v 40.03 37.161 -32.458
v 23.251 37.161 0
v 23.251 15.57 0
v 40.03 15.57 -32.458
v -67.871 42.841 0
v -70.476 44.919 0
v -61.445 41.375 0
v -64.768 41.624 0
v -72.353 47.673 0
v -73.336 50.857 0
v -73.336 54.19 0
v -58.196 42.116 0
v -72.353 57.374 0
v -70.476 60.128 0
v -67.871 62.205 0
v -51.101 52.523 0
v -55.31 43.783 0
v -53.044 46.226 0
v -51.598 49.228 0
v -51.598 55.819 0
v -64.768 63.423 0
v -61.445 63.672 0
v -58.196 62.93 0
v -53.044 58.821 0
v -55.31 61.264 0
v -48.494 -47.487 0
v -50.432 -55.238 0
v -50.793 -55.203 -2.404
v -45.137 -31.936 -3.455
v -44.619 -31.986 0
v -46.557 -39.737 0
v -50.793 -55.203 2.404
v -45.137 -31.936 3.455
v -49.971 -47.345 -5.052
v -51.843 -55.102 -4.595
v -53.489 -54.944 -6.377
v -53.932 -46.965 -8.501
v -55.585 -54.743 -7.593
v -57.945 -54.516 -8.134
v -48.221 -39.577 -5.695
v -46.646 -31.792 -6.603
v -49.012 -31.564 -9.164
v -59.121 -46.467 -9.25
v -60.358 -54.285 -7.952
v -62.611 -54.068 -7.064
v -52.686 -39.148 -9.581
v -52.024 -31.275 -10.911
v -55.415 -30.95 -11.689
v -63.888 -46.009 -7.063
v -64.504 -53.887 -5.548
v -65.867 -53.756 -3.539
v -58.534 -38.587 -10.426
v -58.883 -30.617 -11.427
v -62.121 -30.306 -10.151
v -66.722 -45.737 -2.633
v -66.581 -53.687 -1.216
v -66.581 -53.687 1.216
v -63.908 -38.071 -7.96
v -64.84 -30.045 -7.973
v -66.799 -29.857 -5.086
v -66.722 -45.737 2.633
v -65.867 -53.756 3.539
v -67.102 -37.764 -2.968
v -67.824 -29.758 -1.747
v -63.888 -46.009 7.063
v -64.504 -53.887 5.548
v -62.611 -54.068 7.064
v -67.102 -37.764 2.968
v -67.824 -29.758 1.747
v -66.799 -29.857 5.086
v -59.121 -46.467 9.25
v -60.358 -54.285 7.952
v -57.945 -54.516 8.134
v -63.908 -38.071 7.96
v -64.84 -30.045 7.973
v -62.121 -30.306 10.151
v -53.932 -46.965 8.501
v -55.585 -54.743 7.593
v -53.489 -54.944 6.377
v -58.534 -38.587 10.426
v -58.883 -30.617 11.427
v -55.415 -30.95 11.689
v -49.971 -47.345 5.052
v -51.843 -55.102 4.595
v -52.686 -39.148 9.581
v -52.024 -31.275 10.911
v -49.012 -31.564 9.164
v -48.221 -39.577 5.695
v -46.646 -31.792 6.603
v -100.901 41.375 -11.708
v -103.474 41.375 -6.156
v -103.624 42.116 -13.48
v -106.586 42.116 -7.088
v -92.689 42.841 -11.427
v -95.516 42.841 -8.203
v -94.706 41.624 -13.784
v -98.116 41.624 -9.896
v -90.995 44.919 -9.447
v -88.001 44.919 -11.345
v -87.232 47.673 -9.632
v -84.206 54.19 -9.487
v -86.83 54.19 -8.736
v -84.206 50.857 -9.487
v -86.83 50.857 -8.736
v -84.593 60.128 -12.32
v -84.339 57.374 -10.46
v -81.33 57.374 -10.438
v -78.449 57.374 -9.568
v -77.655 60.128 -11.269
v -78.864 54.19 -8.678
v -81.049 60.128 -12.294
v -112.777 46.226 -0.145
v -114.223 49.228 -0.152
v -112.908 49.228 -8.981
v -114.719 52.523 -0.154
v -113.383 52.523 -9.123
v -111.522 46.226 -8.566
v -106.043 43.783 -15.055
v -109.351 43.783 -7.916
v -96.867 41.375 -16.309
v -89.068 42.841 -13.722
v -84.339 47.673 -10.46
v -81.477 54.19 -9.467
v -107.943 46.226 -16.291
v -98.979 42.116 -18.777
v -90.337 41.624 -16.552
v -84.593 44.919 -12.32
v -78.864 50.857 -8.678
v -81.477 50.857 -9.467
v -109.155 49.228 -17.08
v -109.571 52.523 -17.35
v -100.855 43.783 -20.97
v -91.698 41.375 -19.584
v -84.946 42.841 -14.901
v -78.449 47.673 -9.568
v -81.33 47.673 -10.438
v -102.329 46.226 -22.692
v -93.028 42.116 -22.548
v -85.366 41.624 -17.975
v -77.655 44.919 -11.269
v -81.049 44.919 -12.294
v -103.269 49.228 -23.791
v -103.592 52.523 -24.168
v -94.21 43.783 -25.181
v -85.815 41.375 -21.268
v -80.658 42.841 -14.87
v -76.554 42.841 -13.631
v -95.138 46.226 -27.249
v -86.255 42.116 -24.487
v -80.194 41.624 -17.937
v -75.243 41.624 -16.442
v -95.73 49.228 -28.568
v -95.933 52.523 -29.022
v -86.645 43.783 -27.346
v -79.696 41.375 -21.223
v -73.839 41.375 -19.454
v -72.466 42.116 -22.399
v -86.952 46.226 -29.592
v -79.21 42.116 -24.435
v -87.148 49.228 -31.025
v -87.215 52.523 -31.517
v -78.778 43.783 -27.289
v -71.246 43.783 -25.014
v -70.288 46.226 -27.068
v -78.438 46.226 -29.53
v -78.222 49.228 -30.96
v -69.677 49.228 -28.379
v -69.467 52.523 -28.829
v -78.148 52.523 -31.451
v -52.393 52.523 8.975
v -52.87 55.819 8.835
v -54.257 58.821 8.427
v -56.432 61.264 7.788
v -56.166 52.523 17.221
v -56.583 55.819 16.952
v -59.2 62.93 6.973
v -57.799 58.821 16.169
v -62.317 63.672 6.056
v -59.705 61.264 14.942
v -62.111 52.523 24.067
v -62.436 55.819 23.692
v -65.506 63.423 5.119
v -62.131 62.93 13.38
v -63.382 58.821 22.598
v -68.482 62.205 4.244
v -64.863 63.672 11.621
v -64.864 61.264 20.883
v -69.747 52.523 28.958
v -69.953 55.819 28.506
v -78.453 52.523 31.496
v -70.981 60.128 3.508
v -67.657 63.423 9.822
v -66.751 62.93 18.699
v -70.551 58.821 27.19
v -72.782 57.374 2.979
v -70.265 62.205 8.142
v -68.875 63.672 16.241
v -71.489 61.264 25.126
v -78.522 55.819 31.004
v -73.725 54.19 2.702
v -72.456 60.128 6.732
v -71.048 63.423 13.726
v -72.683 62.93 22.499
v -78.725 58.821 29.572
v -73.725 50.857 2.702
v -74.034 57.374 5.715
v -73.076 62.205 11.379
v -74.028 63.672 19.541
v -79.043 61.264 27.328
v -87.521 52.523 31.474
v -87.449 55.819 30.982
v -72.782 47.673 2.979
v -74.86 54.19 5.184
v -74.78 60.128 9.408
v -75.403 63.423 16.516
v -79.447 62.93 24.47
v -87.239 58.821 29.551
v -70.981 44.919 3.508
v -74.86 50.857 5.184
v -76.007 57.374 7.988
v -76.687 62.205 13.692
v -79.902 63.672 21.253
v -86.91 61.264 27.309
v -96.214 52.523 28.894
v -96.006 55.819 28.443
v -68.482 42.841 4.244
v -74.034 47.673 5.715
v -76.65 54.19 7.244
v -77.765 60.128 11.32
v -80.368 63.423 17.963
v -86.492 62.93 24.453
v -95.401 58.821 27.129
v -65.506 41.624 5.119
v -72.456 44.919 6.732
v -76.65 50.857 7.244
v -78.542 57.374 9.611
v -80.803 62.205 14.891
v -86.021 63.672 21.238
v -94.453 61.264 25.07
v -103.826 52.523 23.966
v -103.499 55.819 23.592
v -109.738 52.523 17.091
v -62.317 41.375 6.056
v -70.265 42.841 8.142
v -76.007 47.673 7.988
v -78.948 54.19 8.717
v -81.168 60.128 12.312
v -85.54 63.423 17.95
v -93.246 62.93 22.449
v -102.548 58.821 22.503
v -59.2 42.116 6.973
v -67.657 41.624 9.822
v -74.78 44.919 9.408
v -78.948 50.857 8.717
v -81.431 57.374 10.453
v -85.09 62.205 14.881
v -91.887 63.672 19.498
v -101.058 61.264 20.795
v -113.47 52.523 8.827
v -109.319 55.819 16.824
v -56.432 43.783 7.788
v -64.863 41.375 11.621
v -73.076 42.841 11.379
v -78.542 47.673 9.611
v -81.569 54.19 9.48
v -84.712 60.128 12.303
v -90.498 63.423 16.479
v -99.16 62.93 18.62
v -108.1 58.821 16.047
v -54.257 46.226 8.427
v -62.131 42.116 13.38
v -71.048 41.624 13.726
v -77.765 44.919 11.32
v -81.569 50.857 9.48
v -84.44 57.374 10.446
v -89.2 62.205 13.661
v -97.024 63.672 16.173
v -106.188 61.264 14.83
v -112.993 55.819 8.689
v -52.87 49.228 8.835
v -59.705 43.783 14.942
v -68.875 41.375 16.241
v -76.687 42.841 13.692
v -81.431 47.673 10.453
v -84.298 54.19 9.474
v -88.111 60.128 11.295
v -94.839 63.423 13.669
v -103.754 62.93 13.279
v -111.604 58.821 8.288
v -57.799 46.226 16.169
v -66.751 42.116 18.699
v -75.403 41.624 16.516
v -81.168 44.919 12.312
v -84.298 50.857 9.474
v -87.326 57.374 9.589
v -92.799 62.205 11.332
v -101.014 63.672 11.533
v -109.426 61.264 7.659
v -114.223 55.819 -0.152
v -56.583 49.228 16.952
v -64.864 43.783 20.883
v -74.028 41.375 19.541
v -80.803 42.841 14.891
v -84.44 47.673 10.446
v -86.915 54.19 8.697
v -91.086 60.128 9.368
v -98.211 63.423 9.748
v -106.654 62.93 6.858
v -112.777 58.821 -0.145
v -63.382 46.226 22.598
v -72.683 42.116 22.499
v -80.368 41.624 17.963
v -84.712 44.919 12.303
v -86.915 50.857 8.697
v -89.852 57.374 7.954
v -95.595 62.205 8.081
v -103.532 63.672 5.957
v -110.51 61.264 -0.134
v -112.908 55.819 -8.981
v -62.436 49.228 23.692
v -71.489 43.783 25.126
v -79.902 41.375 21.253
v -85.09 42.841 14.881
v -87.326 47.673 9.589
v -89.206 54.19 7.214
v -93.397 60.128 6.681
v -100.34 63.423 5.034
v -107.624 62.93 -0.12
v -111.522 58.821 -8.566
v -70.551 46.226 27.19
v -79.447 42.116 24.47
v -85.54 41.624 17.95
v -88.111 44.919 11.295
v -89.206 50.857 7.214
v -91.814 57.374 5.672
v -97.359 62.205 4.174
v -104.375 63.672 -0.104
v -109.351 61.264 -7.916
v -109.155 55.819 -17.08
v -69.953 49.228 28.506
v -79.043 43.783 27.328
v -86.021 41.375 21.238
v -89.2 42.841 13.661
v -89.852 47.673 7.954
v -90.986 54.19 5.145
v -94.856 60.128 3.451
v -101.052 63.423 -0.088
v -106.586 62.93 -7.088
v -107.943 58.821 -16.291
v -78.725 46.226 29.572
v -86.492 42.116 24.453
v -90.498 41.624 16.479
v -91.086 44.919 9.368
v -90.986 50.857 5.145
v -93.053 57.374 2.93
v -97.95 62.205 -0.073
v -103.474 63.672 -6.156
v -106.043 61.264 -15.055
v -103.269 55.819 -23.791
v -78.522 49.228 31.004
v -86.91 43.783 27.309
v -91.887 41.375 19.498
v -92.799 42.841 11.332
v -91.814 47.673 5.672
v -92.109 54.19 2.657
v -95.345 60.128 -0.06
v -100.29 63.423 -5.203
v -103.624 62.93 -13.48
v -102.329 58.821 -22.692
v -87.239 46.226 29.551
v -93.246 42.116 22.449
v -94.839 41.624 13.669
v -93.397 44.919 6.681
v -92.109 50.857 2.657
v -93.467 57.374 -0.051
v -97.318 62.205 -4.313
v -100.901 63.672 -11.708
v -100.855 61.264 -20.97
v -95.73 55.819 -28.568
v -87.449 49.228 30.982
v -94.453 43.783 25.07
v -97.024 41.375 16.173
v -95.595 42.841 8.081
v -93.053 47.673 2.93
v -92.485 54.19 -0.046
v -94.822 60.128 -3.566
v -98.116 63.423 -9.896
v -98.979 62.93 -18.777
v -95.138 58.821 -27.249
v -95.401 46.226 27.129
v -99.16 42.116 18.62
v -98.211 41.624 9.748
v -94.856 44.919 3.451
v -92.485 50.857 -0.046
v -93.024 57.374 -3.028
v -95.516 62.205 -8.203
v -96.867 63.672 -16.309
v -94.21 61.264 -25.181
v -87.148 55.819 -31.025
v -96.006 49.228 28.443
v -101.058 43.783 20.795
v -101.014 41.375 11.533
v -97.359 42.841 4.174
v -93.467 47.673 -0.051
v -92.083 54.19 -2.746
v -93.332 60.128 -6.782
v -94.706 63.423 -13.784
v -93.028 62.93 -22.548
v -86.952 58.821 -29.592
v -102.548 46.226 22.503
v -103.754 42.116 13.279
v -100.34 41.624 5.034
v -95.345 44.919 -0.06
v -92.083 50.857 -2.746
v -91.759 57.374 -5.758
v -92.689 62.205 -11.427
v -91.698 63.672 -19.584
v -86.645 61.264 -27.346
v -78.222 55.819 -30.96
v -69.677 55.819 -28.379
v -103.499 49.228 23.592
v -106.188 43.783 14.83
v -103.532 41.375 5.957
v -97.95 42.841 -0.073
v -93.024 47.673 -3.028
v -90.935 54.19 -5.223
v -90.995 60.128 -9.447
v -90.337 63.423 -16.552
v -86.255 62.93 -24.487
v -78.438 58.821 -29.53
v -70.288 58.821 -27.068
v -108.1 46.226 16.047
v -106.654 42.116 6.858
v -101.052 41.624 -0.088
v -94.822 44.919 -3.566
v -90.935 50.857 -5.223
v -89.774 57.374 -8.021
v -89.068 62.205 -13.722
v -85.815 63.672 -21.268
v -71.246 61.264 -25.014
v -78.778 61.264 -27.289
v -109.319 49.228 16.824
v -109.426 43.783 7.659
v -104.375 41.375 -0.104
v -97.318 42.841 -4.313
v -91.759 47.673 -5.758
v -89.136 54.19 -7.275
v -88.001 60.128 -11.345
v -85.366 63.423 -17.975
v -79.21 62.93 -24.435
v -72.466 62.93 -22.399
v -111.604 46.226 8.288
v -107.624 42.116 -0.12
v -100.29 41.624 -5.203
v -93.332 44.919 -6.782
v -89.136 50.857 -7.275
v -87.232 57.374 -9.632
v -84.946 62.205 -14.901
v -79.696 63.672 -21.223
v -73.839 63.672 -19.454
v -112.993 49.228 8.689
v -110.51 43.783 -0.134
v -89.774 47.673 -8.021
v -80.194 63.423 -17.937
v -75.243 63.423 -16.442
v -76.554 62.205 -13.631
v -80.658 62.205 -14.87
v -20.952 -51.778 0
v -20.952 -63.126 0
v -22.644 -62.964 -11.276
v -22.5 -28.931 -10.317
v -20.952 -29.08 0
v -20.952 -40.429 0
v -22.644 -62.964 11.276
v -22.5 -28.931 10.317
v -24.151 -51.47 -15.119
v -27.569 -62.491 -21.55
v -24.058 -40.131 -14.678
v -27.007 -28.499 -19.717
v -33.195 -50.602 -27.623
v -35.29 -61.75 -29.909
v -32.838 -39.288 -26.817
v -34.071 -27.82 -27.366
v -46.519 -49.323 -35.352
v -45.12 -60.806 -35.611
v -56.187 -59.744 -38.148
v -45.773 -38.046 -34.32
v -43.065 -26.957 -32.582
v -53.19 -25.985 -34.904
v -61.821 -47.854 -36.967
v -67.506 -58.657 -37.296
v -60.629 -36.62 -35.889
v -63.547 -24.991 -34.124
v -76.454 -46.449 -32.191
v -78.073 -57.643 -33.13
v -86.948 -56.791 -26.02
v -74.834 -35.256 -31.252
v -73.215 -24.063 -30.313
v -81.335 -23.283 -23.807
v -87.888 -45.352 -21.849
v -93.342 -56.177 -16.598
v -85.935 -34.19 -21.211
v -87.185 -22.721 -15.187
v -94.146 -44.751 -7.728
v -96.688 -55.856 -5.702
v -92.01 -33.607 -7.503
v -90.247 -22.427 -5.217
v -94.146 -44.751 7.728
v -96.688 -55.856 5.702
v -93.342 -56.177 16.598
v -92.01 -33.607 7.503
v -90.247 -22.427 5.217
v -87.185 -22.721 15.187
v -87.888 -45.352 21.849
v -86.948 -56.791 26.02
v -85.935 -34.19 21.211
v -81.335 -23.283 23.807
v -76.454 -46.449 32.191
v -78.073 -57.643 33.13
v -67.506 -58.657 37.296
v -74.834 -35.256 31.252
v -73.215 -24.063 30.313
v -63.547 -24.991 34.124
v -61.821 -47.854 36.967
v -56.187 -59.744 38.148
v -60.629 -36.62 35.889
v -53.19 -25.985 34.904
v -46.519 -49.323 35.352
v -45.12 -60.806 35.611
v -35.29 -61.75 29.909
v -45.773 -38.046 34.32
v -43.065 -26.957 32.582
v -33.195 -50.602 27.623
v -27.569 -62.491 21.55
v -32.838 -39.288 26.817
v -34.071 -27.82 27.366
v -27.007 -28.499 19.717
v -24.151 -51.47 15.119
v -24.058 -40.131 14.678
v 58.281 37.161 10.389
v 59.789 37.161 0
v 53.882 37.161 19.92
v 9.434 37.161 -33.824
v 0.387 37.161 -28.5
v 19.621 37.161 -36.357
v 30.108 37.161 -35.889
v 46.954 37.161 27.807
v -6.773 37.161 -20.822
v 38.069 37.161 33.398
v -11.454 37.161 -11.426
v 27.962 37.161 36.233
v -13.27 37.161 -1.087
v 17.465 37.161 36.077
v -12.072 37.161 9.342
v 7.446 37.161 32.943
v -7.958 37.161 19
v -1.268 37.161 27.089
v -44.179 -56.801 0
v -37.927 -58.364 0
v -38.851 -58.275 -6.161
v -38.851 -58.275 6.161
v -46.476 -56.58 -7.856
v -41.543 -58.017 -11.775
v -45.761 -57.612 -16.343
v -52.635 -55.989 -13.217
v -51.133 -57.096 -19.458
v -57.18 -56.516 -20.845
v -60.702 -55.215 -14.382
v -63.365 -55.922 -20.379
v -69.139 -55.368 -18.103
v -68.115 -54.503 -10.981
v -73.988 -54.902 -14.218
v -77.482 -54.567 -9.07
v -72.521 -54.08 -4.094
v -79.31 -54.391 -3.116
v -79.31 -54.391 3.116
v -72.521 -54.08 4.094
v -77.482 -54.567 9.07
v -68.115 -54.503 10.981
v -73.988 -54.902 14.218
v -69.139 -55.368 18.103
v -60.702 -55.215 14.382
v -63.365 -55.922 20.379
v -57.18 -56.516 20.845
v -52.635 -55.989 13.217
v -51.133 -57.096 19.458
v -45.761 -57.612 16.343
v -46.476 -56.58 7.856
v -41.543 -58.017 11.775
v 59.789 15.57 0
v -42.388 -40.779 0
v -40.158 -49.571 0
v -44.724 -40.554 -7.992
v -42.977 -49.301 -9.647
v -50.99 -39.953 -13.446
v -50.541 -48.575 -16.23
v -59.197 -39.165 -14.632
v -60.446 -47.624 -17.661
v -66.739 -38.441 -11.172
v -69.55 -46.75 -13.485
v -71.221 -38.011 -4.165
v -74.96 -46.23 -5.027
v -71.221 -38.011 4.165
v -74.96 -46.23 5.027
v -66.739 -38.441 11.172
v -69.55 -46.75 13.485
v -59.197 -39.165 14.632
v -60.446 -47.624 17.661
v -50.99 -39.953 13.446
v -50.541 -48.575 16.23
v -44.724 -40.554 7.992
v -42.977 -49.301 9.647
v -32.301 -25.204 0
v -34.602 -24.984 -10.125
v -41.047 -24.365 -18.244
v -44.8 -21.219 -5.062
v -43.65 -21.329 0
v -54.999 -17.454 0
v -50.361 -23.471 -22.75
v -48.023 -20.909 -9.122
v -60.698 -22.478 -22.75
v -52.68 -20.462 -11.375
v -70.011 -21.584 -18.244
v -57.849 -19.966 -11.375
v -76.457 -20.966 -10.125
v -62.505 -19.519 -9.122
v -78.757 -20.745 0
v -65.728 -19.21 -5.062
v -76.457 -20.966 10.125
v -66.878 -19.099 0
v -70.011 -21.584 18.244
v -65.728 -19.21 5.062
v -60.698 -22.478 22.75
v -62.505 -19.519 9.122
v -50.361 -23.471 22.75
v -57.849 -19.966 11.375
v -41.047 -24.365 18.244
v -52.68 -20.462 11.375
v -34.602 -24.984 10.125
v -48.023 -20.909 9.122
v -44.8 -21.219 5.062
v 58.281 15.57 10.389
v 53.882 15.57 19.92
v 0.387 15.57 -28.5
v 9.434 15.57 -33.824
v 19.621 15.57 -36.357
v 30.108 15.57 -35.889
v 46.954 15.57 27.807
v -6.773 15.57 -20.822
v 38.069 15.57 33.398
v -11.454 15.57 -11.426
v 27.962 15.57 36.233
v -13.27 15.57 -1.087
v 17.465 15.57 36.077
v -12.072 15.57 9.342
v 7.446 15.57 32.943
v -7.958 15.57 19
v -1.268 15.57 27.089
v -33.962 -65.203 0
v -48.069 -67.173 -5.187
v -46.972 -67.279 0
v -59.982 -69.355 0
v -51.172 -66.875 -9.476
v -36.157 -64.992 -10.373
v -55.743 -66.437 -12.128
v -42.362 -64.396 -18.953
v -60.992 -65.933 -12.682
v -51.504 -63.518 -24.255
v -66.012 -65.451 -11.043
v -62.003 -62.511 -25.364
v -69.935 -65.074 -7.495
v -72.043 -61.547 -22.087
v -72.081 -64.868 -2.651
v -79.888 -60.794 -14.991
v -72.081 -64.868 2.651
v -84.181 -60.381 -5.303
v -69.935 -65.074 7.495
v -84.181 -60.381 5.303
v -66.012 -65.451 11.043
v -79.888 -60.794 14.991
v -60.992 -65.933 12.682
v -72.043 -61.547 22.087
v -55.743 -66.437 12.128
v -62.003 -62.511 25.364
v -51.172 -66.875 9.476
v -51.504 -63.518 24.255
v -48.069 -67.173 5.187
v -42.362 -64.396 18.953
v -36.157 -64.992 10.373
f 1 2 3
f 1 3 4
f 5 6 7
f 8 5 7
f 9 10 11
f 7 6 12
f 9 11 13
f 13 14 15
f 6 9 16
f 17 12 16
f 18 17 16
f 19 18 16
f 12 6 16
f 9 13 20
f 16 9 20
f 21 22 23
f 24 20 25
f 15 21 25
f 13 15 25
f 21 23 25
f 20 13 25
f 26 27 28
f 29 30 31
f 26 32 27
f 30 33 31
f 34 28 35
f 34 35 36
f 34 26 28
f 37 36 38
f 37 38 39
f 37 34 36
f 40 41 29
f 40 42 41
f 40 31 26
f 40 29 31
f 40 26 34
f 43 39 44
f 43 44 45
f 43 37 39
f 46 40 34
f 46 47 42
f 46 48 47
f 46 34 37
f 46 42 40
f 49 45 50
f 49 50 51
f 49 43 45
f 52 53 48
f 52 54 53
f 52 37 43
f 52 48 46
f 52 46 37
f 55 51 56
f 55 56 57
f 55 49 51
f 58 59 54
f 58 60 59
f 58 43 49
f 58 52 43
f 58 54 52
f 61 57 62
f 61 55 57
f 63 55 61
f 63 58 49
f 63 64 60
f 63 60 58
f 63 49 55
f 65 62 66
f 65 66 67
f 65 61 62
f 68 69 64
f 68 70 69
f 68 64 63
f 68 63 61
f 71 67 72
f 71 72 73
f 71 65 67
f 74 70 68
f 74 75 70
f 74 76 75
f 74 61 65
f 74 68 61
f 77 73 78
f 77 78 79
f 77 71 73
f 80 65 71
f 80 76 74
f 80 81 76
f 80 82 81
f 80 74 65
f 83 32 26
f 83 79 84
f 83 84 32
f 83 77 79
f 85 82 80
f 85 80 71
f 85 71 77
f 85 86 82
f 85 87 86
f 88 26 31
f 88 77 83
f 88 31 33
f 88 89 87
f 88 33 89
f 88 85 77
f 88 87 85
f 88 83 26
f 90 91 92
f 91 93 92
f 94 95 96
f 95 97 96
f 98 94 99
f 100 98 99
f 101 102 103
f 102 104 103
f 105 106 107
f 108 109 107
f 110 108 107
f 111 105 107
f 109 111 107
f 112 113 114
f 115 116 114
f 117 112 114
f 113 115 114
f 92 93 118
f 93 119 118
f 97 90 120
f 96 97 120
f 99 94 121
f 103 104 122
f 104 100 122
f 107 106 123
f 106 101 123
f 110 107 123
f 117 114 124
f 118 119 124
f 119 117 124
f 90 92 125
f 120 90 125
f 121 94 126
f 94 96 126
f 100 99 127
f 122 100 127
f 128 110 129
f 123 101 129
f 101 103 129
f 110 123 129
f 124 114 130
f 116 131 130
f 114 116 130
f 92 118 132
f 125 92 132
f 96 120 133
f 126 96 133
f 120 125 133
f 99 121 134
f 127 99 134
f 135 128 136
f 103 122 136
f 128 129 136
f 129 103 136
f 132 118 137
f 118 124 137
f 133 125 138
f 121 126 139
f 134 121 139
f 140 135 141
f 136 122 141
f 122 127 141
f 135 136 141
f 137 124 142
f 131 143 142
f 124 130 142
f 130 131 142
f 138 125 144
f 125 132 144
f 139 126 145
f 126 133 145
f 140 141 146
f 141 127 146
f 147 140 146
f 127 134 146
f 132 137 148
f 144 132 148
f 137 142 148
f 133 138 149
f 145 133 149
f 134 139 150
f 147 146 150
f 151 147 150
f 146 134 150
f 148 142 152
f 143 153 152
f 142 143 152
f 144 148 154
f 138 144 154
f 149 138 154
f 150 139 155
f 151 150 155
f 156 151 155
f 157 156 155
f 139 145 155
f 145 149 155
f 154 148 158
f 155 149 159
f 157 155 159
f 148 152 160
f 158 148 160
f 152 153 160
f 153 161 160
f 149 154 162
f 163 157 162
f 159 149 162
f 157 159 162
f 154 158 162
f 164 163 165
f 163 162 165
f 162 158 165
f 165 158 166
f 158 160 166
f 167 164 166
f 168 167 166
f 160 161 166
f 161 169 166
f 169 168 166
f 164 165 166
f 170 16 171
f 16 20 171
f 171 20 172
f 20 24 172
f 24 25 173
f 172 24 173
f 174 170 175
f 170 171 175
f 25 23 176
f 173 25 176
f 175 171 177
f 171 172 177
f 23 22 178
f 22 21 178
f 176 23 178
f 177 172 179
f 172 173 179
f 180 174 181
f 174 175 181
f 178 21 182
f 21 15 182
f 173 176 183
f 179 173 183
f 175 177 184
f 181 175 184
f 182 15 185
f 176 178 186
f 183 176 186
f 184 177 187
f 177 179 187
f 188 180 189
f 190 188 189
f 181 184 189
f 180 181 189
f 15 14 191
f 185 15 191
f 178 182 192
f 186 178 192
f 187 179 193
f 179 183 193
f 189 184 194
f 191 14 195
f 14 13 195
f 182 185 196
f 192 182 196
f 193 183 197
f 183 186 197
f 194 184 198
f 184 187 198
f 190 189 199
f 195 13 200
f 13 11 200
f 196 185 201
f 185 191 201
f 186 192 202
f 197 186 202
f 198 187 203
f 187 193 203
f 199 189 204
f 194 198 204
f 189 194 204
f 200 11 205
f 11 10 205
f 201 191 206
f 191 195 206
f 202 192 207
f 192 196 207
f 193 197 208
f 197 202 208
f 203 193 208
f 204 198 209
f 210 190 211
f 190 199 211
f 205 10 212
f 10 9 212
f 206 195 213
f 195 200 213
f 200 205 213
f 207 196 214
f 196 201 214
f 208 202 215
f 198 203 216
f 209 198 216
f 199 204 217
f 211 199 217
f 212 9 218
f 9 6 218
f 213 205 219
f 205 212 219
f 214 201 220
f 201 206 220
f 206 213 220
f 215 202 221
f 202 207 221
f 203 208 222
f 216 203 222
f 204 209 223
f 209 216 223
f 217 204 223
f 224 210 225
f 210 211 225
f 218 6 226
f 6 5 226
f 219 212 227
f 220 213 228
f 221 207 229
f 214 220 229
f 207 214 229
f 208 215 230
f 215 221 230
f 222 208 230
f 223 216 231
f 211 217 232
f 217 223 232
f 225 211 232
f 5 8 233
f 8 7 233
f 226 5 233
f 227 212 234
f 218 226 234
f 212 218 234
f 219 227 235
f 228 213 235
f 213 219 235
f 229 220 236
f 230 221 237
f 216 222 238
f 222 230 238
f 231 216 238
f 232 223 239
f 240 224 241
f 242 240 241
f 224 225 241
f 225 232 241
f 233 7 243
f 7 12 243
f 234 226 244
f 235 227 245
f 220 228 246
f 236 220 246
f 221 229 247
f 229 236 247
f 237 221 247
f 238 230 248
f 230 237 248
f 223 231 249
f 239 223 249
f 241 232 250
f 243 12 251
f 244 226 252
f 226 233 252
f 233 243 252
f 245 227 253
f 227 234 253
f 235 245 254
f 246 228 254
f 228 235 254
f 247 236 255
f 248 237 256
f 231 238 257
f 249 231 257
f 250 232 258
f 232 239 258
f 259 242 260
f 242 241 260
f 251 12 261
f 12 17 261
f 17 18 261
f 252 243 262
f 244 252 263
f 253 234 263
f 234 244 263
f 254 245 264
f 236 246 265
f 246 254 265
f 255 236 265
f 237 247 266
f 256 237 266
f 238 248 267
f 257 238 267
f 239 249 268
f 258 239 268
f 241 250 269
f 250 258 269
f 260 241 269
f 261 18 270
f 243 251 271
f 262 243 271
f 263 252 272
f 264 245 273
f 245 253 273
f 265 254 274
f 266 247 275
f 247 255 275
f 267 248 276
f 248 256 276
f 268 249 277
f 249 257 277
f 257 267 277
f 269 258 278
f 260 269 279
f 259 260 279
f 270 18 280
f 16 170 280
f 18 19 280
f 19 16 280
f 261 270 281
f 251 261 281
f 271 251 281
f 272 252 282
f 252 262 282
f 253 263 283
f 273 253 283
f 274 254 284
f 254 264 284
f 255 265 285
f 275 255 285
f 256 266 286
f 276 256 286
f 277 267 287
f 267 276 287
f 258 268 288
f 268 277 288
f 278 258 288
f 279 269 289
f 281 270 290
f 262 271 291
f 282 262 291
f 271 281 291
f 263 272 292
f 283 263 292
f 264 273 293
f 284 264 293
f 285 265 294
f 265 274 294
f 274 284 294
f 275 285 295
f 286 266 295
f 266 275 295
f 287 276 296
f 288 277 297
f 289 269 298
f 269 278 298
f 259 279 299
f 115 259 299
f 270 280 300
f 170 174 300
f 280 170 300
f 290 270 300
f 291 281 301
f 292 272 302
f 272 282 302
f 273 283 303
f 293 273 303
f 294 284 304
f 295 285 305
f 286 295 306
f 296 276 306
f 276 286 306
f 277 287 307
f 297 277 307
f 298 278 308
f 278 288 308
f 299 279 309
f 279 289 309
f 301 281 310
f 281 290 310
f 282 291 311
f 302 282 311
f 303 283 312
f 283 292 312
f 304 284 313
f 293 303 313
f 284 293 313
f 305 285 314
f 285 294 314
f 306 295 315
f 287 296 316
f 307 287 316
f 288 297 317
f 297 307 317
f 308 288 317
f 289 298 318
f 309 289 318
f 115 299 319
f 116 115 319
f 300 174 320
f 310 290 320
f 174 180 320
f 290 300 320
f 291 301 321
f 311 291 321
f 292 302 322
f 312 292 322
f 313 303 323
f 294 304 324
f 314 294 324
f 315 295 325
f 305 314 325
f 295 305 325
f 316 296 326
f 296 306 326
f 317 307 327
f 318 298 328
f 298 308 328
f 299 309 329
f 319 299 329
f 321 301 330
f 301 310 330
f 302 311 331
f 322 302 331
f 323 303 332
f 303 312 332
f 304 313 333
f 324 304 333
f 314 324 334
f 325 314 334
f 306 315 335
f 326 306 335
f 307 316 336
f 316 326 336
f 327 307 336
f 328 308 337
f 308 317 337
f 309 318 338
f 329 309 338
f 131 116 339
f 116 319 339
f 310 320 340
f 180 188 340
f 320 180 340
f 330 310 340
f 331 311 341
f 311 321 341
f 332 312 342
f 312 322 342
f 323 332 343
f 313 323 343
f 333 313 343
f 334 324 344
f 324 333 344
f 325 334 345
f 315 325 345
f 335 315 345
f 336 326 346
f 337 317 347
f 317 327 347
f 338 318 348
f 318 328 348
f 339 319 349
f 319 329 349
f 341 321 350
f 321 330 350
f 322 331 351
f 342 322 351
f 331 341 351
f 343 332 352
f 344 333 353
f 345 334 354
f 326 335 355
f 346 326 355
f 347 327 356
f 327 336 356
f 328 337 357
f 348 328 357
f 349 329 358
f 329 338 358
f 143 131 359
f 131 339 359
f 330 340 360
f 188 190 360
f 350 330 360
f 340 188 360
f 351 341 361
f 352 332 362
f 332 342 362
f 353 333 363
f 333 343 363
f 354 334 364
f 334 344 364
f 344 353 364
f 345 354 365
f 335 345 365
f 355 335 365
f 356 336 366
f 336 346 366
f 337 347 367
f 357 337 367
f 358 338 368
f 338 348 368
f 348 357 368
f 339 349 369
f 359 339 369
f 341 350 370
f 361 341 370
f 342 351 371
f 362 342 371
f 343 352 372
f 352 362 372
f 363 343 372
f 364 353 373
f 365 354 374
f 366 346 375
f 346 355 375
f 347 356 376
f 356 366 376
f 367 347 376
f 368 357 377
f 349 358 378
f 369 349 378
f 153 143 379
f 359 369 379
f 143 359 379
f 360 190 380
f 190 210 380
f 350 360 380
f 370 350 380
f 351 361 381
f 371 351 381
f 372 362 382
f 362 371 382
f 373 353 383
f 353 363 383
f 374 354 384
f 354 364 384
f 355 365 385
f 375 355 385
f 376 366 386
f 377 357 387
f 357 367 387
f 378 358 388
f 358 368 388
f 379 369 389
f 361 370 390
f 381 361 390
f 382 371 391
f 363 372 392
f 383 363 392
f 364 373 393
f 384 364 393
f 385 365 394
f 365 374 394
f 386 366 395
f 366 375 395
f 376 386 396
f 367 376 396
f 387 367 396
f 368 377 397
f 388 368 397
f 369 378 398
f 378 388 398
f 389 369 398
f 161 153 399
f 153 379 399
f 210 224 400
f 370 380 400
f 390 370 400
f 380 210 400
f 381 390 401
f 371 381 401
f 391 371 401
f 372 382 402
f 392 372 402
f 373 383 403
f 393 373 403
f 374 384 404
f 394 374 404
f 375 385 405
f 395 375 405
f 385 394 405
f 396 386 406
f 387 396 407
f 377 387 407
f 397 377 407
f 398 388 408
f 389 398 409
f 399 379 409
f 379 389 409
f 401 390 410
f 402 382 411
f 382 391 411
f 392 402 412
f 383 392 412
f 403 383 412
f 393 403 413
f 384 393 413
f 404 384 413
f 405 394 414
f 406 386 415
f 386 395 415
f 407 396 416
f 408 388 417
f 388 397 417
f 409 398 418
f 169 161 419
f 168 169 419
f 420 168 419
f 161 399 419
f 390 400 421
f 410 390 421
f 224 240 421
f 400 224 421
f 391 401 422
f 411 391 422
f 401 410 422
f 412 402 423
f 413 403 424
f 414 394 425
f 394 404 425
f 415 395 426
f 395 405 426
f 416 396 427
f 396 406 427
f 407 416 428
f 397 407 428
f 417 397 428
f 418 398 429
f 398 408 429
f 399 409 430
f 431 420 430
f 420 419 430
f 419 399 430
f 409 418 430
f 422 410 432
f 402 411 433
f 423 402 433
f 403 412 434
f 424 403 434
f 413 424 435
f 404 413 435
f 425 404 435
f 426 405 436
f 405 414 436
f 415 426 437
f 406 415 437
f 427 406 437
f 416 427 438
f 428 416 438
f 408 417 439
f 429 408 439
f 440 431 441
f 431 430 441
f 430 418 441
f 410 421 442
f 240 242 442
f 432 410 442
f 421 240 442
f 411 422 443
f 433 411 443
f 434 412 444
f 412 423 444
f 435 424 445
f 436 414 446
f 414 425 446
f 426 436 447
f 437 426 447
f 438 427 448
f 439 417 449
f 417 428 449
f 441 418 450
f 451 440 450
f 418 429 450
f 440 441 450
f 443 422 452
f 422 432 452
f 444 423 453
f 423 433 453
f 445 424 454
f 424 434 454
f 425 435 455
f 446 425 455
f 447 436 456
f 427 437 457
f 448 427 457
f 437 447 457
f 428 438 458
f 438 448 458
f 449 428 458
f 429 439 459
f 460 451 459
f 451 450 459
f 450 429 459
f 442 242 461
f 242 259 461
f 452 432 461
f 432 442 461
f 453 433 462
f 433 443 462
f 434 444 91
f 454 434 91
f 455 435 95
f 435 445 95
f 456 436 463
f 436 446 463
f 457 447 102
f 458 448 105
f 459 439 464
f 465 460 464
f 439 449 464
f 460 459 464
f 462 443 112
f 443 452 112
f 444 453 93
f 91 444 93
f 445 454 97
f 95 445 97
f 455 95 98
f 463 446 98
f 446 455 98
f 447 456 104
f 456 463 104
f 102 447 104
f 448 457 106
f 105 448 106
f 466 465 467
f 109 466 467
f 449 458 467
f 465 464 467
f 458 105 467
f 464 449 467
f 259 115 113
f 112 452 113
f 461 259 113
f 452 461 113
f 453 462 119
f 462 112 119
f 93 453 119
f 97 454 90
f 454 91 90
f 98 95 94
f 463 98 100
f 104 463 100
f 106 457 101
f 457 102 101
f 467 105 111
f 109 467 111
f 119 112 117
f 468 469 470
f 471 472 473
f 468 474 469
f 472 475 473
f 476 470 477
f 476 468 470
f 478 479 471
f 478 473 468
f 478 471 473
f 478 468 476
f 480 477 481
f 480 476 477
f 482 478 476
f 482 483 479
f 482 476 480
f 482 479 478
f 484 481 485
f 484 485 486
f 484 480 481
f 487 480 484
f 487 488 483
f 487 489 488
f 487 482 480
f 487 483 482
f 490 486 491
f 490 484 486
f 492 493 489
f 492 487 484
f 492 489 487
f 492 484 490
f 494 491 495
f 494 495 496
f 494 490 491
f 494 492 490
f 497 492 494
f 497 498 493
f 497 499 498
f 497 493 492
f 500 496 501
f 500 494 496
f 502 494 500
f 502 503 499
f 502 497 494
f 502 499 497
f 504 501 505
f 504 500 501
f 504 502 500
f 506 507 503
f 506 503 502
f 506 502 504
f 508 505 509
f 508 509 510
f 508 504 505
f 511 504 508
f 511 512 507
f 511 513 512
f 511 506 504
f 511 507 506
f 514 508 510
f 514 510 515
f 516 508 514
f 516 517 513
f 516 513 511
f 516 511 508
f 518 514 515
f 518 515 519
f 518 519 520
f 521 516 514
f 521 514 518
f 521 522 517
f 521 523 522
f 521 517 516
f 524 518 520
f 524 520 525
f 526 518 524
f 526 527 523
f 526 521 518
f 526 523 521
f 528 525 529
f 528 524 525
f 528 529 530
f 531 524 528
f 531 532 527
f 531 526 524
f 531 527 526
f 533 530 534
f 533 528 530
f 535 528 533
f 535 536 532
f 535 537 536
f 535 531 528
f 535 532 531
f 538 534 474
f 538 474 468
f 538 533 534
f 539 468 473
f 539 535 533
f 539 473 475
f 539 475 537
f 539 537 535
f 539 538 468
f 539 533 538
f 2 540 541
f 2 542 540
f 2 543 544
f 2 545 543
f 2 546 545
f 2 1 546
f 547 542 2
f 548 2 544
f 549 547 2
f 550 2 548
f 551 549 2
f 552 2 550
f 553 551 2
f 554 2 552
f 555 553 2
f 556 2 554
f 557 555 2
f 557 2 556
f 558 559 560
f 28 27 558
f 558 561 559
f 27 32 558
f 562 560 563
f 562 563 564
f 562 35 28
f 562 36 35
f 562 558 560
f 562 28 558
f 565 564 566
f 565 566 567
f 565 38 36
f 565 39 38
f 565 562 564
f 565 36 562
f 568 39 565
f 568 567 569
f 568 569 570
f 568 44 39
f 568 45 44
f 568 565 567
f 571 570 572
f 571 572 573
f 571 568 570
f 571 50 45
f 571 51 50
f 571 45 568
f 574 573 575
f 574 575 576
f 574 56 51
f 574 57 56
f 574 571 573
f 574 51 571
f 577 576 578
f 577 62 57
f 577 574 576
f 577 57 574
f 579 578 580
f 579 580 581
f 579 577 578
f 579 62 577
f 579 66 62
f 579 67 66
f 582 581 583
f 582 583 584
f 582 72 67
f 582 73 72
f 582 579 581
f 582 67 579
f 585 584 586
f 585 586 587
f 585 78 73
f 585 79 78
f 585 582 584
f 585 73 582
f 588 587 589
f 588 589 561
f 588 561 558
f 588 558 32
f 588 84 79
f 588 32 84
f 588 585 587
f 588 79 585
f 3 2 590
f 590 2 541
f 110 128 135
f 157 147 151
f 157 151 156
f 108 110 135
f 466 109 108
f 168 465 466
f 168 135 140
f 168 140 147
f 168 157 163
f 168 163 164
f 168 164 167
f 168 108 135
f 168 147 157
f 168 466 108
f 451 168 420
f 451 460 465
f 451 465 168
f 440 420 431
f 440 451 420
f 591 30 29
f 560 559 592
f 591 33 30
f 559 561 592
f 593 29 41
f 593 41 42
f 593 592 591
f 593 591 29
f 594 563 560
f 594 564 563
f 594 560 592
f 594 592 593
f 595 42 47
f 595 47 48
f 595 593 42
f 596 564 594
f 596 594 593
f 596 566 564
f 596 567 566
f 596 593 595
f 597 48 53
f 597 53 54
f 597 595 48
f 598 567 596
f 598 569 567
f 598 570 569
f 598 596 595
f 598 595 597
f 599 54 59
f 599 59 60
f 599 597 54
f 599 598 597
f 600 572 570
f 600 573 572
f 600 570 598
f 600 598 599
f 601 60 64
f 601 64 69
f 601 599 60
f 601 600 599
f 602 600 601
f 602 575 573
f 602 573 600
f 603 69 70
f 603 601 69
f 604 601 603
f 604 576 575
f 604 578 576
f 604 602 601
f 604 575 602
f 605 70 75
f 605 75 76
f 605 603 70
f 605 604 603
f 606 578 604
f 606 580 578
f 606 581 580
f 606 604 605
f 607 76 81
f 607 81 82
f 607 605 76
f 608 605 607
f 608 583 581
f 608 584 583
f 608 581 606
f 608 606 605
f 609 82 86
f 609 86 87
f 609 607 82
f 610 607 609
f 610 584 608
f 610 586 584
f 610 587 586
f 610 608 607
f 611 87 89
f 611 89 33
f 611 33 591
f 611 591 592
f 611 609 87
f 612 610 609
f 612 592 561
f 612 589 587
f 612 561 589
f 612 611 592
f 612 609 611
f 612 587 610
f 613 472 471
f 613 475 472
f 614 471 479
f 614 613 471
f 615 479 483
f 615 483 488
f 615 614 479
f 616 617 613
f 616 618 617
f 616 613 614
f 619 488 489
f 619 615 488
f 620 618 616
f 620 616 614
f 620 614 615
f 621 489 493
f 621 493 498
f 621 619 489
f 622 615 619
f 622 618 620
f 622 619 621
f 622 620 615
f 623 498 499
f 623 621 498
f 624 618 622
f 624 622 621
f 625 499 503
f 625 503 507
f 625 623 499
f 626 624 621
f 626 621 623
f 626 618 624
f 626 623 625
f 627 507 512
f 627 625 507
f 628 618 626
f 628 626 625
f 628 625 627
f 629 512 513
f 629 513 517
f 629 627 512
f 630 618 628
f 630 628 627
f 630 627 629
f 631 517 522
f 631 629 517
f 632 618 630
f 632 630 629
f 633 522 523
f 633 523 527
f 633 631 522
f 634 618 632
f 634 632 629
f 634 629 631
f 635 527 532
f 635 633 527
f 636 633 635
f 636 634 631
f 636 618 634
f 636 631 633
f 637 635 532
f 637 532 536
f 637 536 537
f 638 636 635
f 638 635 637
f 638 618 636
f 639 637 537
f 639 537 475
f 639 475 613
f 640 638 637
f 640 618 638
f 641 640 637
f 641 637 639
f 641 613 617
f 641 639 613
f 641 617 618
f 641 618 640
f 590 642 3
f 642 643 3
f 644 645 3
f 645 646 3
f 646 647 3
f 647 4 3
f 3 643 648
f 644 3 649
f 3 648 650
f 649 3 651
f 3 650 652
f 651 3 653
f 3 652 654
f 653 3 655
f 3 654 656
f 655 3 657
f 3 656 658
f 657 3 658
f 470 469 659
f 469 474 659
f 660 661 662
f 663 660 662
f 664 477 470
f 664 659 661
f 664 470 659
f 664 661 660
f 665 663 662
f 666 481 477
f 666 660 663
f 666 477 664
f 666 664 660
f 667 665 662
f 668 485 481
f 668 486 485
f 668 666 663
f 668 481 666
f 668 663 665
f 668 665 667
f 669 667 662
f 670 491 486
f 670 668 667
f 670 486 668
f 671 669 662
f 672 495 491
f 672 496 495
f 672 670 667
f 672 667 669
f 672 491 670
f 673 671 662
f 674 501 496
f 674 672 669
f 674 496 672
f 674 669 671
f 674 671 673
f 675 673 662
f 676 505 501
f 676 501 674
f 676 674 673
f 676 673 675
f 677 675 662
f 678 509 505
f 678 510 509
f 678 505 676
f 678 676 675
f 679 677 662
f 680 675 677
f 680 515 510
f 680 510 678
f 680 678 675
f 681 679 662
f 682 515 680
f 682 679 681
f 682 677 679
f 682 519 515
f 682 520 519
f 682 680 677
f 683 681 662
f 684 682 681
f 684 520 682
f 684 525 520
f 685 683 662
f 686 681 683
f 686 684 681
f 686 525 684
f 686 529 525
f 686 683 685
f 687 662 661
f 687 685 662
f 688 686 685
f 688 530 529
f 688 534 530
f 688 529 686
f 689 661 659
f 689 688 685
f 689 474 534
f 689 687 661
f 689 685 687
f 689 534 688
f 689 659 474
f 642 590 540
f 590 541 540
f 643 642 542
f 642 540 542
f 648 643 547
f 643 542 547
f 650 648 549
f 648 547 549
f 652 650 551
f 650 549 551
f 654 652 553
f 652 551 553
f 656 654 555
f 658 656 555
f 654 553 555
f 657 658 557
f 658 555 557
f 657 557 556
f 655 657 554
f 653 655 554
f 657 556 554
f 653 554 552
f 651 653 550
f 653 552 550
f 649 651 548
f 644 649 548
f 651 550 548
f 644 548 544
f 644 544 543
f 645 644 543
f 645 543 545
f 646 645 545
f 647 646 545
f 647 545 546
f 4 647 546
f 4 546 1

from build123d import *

# Parameters (mm, degrees)
F0_W     = 36.5379918367
F0_H     = 21.5906333178
F1_ANGLE = 297.3352044647
F0_R     = 11.1797222355
F2_ANGLE = 295


with BuildPart() as f1:
    # F0 (on Top) → F1 (revolve)
    with BuildSketch(Plane.XY):
        with Locations((41.5204456076, 26.3654785231)):
            Rectangle(F0_W, F0_H)
    revolve(axis=Axis((23.2514496893, 26.3654785231, 0), (0, -1, 0)), revolution_arc=F1_ANGLE)


with BuildPart() as f2:
    # F0 (on Top) → F2 (revolve)
    with BuildSketch(Plane.XY):
        with Locations((-62.280677259, 52.5233596563)):
            Circle(F0_R)
    revolve(axis=Axis((-82.9103291035, 50.9820729494, 0), (0, -1, 0)), revolution_arc=F2_ANGLE)


with BuildPart() as f3:
    # F0 (on Top) → F3 (revolve)
    with BuildSketch(Plane.XY):
        Polygon((-20.9524314851, -29.0797241032), (-54.9991987646, -17.4539964646), (-59.9816553295, -69.3545565009), (-20.9524314851, -63.1264895201), align=None)
        Polygon((-50.4319518805, -55.2375987172), (-44.6190871298, -31.9861508906), (-37.9269696142, -58.3638457864), align=None, mode=Mode.SUBTRACT)
    revolve(axis=Axis((-57.490427047, -43.4042764828, 0), (0.0955607196, 0.9954236027, 0)))


solid = Compound([f1.part, f2.part, f3.part])
